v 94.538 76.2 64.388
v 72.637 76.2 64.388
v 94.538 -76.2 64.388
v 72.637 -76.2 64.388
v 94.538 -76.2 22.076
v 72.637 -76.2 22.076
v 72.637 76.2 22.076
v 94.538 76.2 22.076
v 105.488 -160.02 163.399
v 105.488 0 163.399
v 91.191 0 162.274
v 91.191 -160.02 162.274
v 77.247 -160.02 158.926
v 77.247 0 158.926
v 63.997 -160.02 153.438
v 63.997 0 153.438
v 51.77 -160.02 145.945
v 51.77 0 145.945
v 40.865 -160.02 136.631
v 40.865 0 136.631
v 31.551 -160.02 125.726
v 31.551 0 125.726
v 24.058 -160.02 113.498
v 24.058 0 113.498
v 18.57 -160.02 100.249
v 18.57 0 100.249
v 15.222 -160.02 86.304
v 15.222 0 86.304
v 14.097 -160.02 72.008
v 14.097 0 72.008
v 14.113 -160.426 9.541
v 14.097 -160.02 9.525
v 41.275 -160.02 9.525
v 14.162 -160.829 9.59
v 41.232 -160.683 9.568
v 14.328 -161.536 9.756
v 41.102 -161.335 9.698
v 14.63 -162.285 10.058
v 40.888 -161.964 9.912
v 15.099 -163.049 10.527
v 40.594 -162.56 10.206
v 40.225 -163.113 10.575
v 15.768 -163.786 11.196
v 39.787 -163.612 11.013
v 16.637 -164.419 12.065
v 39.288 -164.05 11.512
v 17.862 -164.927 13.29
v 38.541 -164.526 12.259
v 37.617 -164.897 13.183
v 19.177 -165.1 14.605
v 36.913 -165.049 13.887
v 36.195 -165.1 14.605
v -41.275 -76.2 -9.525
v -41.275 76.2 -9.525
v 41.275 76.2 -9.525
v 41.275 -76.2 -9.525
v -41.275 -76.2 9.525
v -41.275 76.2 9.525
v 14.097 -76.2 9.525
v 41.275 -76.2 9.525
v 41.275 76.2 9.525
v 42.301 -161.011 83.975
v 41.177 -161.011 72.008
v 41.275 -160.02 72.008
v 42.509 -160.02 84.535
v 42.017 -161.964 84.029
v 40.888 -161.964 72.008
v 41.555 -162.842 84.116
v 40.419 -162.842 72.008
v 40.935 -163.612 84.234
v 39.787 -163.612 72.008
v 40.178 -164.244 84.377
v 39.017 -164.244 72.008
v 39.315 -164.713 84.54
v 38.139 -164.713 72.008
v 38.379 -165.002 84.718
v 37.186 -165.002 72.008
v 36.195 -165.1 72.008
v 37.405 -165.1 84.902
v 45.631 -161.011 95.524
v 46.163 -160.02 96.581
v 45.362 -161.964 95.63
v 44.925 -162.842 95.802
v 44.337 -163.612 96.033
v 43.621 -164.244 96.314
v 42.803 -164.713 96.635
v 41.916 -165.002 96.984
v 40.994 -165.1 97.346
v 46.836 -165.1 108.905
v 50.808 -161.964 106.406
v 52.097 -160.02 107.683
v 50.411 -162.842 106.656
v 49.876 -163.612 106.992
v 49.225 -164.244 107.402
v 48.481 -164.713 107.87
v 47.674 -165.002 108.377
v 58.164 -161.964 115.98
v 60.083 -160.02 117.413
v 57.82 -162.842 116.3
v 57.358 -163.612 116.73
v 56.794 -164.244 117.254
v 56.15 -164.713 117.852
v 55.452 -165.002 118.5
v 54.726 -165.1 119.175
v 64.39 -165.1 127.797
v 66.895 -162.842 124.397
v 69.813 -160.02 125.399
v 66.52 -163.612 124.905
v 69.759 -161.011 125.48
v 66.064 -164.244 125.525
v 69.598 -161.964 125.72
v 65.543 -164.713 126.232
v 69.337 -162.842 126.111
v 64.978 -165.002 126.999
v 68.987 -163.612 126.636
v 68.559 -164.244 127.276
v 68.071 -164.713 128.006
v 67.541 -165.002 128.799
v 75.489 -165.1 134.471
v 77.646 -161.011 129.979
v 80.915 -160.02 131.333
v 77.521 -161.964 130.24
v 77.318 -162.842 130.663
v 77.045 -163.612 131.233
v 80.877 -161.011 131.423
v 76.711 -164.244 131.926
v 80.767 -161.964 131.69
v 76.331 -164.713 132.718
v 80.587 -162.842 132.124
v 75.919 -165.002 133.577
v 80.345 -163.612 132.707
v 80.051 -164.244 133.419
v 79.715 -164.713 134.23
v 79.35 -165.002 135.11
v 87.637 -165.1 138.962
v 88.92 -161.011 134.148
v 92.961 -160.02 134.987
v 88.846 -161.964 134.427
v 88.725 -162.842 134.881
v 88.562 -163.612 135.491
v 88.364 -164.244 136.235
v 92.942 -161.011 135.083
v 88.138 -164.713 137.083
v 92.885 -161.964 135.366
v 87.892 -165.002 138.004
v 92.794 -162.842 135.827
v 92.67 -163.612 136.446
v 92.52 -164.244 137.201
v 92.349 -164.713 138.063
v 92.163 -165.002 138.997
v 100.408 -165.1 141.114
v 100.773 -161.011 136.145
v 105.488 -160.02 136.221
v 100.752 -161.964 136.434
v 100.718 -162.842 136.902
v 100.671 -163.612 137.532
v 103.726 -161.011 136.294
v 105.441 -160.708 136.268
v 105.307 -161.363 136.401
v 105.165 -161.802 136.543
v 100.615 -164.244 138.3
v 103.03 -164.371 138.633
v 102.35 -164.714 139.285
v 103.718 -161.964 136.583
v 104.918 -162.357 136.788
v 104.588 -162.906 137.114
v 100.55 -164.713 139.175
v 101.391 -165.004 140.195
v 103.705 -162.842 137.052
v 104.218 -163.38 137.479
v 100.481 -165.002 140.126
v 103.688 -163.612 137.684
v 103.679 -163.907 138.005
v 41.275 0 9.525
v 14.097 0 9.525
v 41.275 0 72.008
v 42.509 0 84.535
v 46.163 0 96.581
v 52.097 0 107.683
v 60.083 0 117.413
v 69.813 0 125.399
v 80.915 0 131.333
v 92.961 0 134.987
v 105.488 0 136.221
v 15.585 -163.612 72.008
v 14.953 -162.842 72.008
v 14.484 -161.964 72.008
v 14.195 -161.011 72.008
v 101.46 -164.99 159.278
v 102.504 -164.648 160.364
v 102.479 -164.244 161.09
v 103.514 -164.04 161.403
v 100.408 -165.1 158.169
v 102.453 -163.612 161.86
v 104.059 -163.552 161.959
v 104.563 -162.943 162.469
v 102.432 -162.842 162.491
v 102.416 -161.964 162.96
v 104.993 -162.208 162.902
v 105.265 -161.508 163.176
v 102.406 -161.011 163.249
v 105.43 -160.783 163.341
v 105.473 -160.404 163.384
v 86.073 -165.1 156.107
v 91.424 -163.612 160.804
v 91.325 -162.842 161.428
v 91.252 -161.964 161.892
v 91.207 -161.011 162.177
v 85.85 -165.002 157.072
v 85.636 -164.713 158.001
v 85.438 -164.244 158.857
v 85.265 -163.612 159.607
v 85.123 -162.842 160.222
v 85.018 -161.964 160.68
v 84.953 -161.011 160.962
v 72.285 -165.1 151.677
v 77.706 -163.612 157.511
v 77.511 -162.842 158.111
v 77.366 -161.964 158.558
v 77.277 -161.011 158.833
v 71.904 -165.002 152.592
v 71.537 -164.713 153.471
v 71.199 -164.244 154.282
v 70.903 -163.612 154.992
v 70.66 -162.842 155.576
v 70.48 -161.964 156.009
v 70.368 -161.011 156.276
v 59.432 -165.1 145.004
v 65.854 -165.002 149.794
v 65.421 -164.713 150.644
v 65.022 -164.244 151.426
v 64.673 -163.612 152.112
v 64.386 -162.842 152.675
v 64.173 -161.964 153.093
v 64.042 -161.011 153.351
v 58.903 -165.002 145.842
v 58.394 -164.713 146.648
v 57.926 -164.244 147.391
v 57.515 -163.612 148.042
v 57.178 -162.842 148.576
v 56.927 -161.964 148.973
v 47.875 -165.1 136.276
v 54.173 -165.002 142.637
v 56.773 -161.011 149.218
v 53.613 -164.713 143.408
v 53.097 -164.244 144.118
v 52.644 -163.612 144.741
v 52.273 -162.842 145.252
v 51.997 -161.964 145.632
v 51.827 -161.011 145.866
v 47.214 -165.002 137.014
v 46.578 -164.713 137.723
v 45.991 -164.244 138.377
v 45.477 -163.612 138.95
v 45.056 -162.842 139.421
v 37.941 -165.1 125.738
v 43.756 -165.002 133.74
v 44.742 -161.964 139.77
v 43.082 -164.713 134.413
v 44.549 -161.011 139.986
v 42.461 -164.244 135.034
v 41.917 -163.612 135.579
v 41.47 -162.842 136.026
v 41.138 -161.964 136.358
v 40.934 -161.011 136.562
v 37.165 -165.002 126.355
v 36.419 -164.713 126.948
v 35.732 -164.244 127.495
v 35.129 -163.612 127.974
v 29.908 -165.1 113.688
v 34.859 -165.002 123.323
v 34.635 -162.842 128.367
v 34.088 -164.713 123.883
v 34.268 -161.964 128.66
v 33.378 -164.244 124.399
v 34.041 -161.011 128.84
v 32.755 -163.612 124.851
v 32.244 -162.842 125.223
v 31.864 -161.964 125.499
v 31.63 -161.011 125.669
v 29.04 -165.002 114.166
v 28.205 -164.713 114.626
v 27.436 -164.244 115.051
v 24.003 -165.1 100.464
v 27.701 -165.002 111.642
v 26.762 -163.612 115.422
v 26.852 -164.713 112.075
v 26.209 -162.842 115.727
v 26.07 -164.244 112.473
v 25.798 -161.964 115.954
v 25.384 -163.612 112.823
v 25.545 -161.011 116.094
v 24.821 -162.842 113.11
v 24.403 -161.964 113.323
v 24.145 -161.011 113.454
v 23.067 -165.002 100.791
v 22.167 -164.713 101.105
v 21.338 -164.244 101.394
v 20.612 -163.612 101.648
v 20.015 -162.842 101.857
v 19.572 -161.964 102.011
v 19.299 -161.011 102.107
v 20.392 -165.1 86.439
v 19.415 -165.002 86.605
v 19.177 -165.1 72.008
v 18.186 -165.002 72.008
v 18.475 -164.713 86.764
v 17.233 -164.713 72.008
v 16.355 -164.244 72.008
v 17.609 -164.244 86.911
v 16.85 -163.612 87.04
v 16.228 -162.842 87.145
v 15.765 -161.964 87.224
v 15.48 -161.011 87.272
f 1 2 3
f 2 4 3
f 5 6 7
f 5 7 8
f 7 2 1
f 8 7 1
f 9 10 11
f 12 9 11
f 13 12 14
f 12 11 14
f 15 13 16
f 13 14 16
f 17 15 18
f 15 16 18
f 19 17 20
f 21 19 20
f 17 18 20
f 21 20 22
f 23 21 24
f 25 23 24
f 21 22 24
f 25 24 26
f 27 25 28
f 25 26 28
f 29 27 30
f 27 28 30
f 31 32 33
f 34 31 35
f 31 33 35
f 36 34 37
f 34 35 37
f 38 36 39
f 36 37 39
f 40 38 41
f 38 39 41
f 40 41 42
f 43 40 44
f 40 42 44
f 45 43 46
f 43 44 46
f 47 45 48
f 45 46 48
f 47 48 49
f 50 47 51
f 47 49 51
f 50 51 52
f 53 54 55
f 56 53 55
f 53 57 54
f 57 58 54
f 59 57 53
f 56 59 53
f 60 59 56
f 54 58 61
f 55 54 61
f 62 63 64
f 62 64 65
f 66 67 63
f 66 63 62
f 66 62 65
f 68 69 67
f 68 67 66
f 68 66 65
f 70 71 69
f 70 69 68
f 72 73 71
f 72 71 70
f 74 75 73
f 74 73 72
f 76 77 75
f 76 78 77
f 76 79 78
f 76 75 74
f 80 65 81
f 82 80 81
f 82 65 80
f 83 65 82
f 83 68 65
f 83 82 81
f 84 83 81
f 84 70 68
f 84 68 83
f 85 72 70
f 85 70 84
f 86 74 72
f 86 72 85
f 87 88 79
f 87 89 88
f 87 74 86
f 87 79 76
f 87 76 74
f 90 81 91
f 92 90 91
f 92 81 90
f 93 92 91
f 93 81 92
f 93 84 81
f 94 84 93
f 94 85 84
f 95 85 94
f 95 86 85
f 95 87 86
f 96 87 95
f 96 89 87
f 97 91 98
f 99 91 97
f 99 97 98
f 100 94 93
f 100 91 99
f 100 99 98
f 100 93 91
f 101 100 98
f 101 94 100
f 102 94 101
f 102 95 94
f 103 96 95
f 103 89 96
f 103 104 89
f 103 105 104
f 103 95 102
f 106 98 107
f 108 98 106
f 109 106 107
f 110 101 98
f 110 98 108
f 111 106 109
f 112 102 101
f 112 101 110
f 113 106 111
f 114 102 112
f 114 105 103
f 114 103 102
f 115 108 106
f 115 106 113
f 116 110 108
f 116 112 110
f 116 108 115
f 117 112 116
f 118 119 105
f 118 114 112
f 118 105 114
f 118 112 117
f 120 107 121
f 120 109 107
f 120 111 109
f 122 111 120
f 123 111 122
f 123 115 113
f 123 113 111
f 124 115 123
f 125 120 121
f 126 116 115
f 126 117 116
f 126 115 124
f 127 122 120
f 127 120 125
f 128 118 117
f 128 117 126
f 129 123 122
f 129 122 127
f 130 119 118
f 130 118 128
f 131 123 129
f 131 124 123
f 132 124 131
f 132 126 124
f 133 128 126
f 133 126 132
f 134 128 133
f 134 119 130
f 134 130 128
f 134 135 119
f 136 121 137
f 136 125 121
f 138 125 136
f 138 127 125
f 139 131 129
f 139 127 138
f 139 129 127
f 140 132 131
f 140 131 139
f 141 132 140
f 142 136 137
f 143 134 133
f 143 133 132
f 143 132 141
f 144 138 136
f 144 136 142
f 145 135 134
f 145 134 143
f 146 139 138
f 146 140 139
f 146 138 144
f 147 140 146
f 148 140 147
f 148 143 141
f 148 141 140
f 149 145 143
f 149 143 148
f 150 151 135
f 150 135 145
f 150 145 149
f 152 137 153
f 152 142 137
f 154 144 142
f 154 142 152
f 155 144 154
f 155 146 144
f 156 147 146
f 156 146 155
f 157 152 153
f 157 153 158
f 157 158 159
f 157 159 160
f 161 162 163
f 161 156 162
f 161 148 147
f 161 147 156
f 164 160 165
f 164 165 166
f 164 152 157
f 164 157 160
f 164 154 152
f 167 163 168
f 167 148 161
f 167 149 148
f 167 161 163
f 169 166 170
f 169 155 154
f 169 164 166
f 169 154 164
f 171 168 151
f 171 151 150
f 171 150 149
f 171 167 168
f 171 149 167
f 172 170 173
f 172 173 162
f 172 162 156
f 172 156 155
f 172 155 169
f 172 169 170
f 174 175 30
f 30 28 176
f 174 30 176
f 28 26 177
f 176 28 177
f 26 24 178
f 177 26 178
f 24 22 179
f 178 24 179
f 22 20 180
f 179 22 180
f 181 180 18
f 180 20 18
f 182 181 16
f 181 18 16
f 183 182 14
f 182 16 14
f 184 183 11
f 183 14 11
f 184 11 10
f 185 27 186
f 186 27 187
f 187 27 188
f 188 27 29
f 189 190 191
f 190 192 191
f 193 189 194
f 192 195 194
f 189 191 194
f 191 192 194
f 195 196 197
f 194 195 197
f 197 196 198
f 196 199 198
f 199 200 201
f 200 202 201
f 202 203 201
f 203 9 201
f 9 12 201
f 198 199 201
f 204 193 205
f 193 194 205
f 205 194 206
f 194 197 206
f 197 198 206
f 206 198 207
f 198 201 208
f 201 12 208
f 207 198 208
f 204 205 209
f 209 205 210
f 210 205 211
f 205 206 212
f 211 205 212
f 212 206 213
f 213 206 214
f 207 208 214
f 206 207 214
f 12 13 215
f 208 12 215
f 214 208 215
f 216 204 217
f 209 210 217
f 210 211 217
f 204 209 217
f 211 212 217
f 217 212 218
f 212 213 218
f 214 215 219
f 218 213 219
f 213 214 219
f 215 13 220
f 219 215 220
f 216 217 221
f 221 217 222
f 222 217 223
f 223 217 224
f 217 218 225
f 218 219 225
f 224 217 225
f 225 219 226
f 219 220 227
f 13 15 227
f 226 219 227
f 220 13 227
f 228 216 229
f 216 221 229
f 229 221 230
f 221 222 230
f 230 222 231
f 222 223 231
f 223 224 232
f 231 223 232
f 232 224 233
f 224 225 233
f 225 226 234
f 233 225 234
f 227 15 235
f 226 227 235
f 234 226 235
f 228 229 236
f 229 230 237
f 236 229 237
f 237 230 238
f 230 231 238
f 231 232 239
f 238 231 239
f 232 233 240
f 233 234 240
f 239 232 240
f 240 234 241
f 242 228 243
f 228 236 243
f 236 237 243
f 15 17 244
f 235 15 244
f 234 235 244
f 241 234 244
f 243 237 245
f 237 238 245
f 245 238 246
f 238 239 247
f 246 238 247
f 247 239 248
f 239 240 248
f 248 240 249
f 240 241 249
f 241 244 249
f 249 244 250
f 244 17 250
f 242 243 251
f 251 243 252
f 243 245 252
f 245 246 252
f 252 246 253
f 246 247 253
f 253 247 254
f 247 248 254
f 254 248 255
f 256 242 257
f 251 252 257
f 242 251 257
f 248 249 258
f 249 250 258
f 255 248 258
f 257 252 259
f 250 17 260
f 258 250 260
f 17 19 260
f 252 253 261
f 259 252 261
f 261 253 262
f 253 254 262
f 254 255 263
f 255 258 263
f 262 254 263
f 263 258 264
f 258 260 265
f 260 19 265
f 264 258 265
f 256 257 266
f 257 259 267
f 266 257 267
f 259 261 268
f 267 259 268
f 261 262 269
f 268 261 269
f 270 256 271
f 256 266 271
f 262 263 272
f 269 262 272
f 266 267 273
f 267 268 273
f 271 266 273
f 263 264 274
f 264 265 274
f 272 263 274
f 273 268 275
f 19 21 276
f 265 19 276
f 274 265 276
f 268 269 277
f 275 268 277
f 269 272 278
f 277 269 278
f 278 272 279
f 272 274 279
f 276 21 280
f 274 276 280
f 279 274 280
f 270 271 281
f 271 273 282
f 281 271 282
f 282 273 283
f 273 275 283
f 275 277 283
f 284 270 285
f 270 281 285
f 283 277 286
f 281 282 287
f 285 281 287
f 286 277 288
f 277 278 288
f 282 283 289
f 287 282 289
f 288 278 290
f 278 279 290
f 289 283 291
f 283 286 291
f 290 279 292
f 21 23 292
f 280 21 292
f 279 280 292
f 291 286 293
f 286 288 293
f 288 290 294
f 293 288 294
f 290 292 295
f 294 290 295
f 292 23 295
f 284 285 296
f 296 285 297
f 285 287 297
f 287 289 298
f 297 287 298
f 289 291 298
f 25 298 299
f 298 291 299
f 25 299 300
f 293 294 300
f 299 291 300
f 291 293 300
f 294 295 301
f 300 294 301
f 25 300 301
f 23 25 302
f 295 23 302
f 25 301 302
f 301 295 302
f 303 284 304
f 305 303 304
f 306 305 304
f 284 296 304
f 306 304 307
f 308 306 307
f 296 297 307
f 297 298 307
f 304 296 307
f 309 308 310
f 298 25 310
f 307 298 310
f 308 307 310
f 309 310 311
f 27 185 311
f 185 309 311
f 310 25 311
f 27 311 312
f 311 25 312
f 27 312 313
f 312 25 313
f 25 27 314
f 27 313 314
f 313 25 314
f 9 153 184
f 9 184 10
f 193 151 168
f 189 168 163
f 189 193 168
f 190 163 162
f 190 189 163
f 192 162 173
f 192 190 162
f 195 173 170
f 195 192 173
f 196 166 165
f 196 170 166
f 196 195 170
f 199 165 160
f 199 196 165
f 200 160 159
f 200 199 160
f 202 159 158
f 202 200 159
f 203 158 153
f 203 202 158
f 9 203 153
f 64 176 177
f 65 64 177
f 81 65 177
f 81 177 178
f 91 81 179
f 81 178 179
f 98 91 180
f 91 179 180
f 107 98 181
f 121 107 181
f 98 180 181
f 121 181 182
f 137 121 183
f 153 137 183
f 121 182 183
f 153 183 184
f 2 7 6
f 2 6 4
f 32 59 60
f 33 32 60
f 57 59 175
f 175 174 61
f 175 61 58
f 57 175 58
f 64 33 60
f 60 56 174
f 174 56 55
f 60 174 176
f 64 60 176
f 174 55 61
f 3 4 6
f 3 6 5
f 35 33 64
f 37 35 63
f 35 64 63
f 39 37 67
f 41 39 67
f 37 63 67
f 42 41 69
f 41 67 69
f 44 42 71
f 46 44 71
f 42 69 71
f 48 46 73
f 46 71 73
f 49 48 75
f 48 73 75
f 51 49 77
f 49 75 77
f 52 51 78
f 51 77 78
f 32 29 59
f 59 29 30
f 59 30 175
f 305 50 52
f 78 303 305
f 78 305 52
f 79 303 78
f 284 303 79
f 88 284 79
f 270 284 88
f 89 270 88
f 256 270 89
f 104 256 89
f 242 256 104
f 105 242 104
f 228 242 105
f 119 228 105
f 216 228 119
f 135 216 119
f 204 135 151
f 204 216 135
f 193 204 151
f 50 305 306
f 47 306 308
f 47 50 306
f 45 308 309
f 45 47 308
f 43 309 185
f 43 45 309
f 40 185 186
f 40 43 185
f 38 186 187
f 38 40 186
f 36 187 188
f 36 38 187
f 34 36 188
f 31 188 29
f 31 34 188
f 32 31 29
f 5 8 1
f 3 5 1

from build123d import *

# Parameters (mm, degrees)
F0_W     = 21.900531
F0_H     = 42.312413
F1_DEPTH = 76.2
F2_DEPTH = 165.1
F3_R     = 5.08


with BuildPart() as f1:
    # F0 (on Front) → F1 (new body, symmetric)
    with BuildSketch(Plane.XZ):
        Polygon((41.275, -9.525), (41.275, 9.525), (14.097002, 9.525), (-41.275, 9.525), (-41.275, -9.525), align=None)
        with Locations((83.587408, 43.232253)):
            Rectangle(F0_W, F0_H)
    extrude(amount=F1_DEPTH, both=True)

    # F0 (on Front) → F2 (join)
    with BuildSketch(Plane.XZ):
        with BuildLine():
            Line((14.097002, 9.525), (41.275, 9.525))
            Line((41.275, 9.525), (41.275, 72.007786))
            ThreePointArc((41.275, 72.007786), (60.082535, 117.413191), (105.487939, 136.220725))
            Line((105.487939, 136.220725), (105.487939, 163.398723))
            ThreePointArc((105.487939, 163.398723), (40.864788, 136.630937), (14.097002, 72.007786))
            Line((14.097002, 72.007786), (14.097002, 9.525))
        make_face()
    extrude(amount=F2_DEPTH)

    # F3
    f3_edges = [f1.edges().sort_by_distance(p)[0] for p in [
        (41.275, -165.1, 40.766393),
        (14.097002, -165.1, 40.766393),
        (27.686001, -165.1, 9.525),
        (60.082535, -165.1, 117.413191),
        (105.487939, -165.1, 149.809724),
        (40.864788, -165.1, 136.630937),
    ]]
    fillet(f3_edges, radius=F3_R)


solid = f1.part
